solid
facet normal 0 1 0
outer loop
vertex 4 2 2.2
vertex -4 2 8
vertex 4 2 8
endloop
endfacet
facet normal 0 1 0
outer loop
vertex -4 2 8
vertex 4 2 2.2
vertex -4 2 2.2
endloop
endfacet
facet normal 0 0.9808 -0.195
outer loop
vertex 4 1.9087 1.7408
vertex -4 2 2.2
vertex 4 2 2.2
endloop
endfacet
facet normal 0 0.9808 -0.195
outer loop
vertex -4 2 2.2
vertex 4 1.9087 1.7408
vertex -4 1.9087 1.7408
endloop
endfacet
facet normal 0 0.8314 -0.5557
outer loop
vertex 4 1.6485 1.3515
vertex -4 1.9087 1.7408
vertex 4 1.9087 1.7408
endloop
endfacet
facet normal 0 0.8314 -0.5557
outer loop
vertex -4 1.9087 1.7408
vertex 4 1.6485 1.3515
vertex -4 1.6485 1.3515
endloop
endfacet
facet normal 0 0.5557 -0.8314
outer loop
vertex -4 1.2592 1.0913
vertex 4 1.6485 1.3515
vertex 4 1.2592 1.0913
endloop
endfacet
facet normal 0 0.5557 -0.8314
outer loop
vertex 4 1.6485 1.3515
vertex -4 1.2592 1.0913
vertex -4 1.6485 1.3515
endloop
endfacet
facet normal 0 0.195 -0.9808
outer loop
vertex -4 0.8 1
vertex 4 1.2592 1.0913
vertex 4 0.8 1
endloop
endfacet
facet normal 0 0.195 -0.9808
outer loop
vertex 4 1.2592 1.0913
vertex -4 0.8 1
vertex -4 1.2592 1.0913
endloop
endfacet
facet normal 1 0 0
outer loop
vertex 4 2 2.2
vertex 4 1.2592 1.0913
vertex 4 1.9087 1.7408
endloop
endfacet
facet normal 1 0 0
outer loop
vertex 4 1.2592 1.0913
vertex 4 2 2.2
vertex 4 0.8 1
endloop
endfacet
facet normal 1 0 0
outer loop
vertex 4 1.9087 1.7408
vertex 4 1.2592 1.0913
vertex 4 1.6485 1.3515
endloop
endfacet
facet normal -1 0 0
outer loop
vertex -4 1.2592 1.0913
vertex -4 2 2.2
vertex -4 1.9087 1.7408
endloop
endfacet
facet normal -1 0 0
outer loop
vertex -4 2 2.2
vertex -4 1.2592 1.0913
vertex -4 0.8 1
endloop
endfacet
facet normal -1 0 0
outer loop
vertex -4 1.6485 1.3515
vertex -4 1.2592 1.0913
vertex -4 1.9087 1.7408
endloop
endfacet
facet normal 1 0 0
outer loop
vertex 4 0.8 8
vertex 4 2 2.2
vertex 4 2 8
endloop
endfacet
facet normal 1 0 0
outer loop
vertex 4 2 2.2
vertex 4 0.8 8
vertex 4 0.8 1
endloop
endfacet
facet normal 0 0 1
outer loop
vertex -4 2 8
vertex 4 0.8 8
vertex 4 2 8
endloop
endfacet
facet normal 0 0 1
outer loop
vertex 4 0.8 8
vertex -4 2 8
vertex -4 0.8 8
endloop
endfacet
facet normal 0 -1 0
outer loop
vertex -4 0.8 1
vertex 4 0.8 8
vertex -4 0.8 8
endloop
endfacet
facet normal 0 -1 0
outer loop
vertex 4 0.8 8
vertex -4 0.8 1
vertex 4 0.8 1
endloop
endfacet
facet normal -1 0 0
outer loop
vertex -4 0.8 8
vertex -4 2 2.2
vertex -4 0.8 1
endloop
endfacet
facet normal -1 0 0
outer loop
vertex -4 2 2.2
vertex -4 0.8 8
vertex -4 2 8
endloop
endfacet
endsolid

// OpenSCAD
// file: ../p/1-4edge.scad
use <../lib.scad>
function ldraw_lib__1_4edge() = [
// 0 Circle 0.25
// 0 Name: 1-4edge.dat
// 0 Author: James Jessiman
// 0 !LDRAW_ORG Primitive UPDATE 2017-01
// 0 !LICENSE Licensed under CC BY 2.0 and CC BY 4.0 : see CAreadme.txt
// 
// 0 BFC CERTIFY CCW
  [0,"BFC","CERTIFY"],
  [0,"BFC","CCW"],
// 
// 0 !HISTORY 2007-06-22 [PTadmin] Header formatted for Contributor Agreement
// 0 !HISTORY 2008-07-01 [PTadmin] Official Update 2008-01
// 0 !HISTORY 2017-01-15 [Steffen] BFCed
// 0 !HISTORY 2017-12-30 [PTadmin] Official Update 2017-01
// 
// 
// 2 24 1 0 0 0.9239 0 0.3827
  [2,24,1,0,0,0.9239,0,0.3827],
// 2 24 0.9239 0 0.3827 0.7071 0 0.7071
  [2,24,0.9239,0,0.3827,0.7071,0,0.7071],
// 2 24 0.7071 0 0.7071 0.3827 0 0.9239
  [2,24,0.7071,0,0.7071,0.3827,0,0.9239],
// 2 24 0.3827 0 0.9239 0 0 1
  [2,24,0.3827,0,0.9239,0,0,1],
];
makepoly(ldraw_lib__1_4edge(), line=0.2);
// file: ../p/1-4cyli.scad
use <../lib.scad>
function ldraw_lib__1_4cyli() = [
// 0 Cylinder 0.25
// 0 Name: 1-4cyli.dat
// 0 Author: James Jessiman
// 0 !LDRAW_ORG Primitive UPDATE 2012-01
// 0 !LICENSE Licensed under CC BY 2.0 and CC BY 4.0 : see CAreadme.txt
// 
// 0 BFC CERTIFY CCW
  [0,"BFC","CERTIFY"],
  [0,"BFC","CCW"],
// 
// 0 !HISTORY 2002-03-23 [sbliss] Added BFC statement.
// 0 !HISTORY 2002-04-25 [PTadmin] Official Update 2002-02
// 0 !HISTORY 2007-06-22 [PTadmin] Header formatted for Contributor Agreement
// 0 !HISTORY 2008-07-01 [PTadmin] Official Update 2008-01
// 0 !HISTORY 2012-02-16 [Philo] Changed to CCW
// 0 !HISTORY 2012-03-30 [PTadmin] Official Update 2012-01
// 
// 
// 4 16 1 1 0 0.9239 1 0.3827 0.9239 0 0.3827 1 0 0
  [4,16,1,1,0,0.9239,1,0.3827,0.9239,0,0.3827,1,0,0],
// 5 24 1 0 0 1 1 0 0.9239 0 0.3827 1 0 -1
  [5,24,1,0,0,1,1,0,0.9239,0,0.3827,1,0,-1],
// 4 16 0.9239 1 0.3827 0.7071 1 0.7071 0.7071 0 0.7071 0.9239 0 0.3827
  [4,16,0.9239,1,0.3827,0.7071,1,0.7071,0.7071,0,0.7071,0.9239,0,0.3827],
// 5 24 0.9239 0 0.3827 0.9239 1 0.3827 0.7071 0 0.7071 1 0 0
  [5,24,0.9239,0,0.3827,0.9239,1,0.3827,0.7071,0,0.7071,1,0,0],
// 4 16 0.7071 1 0.7071 0.3827 1 0.9239 0.3827 0 0.9239 0.7071 0 0.7071
  [4,16,0.7071,1,0.7071,0.3827,1,0.9239,0.3827,0,0.9239,0.7071,0,0.7071],
// 5 24 0.7071 0 0.7071 0.7071 1 0.7071 0.3827 0 0.9239 0.9239 0 0.3827
  [5,24,0.7071,0,0.7071,0.7071,1,0.7071,0.3827,0,0.9239,0.9239,0,0.3827],
// 4 16 0.3827 1 0.9239 0 1 1 0 0 1 0.3827 0 0.9239
  [4,16,0.3827,1,0.9239,0,1,1,0,0,1,0.3827,0,0.9239],
// 5 24 0.3827 0 0.9239 0.3827 1 0.9239 0 0 1 0.7071 0 0.7071
  [5,24,0.3827,0,0.9239,0.3827,1,0.9239,0,0,1,0.7071,0,0.7071],
// 5 24 0 0 1 0 1 1 0.3827 0 0.9239 -1 0 1
  [5,24,0,0,1,0,1,1,0.3827,0,0.9239,-1,0,1],
];
makepoly(ldraw_lib__1_4cyli(), line=0.2);
// file: ../p/rect3.scad
use <../lib.scad>
function ldraw_lib__rect3() = [
// 0 Rectangle with 3 Edges
// 0 Name: rect3.dat
// 0 Author: Mark Kennedy [mkennedy]
// 0 !LDRAW_ORG Primitive UPDATE 2010-01
// 0 !LICENSE Licensed under CC BY 2.0 and CC BY 4.0 : see CAreadme.txt
// 
// 0 BFC CERTIFY CCW
  [0,"BFC","CERTIFY"],
  [0,"BFC","CCW"],
// 
// 0 !HISTORY 2003-08-01 [PTadmin] Official Update 2003-02
// 0 !HISTORY 2007-06-24 [PTadmin] Header formatted for Contributor Agreement
// 0 !HISTORY 2008-07-01 [PTadmin] Official Update 2008-01
// 0 !HISTORY 2010-01-17 [mikeheide] Change winding to CCW
// 0 !HISTORY 2010-04-05 [PTadmin] Official Update 2010-01
// 
// 
// 2 24 1 0 1 -1 0 1
  [2,24,1,0,1,-1,0,1],
// 2 24 1 0 1 1 0 -1
  [2,24,1,0,1,1,0,-1],
// 2 24 -1 0 1 -1 0 -1
  [2,24,-1,0,1,-1,0,-1],
// 4 16 -1 0 1 -1 0 -1 1 0 -1 1 0 1
  [4,16,-1,0,1,-1,0,-1,1,0,-1,1,0,1],
// 0 //
];
makepoly(ldraw_lib__rect3(), line=0.2);
// file: ../p/1-4cylo.scad
use <../lib.scad>
use <1-4cyli.scad>
use <1-4edge.scad>
function ldraw_lib__1_4cylo() = [
// 0 Cylinder Open 0.25
// 0 Name: 1-4cylo.dat
// 0 Author: Max Martin Richter [MMR1988]
// 0 !LDRAW_ORG Primitive UPDATE 2010-03
// 0 !LICENSE Licensed under CC BY 2.0 and CC BY 4.0 : see CAreadme.txt
// 
// 0 BFC CERTIFY CCW
  [0,"BFC","CERTIFY"],
  [0,"BFC","CCW"],
// 
// 0 !HISTORY 2010-12-31 [PTadmin] Official Update 2010-03
// 
// 
// 1 16 0 0 0 1 0 0 0 1 0 0 0 1 1-4edge.dat
  [1,16,0,0,0,1,0,0,0,1,0,0,0,1, ldraw_lib__1_4edge()],
// 1 16 0 1 0 1 0 0 0 1 0 0 0 1 1-4edge.dat
  [1,16,0,1,0,1,0,0,0,1,0,0,0,1, ldraw_lib__1_4edge()],
// 1 16 0 0 0 1 0 0 0 1 0 0 0 1 1-4cyli.dat
  [1,16,0,0,0,1,0,0,0,1,0,0,0,1, ldraw_lib__1_4cyli()],
];
makepoly(ldraw_lib__1_4cylo(), line=0.2);
// file: ../p/1-4chrd.scad
use <../lib.scad>
function ldraw_lib__1_4chrd() = [
// 0 Chord 0.25
// 0 Name: 1-4chrd.dat
// 0 Author: Tony Hafner [hafhead]
// 0 !LDRAW_ORG Primitive UPDATE 2012-02
// 0 !LICENSE Licensed under CC BY 2.0 and CC BY 4.0 : see CAreadme.txt
// 
// 0 BFC CERTIFY CCW
  [0,"BFC","CERTIFY"],
  [0,"BFC","CCW"],
// 
// 0 !HISTORY 2004-04-22 [PTadmin] Official Update 2004-02
// 0 !HISTORY 2007-10-09 [PTadmin] Header formatted for Contributor Agreement
// 0 !HISTORY 2008-07-01 [PTadmin] Official Update 2008-01
// 0 !HISTORY 2012-08-02 [MMR1988] Re-creation with PrimGen2 and Rectifier
// 0 !HISTORY 2012-08-09 [PTadmin] Official Update 2012-02
// 
// 
// 4 16 0.9239 0 0.3827 0.3827 0 0.9239 0 0 1 1 0 0
  [4,16,0.9239,0,0.3827,0.3827,0,0.9239,0,0,1,1,0,0],
// 3 16 0.7071 0 0.7071 0.3827 0 0.9239 0.9239 0 0.3827
  [3,16,0.7071,0,0.7071,0.3827,0,0.9239,0.9239,0,0.3827],
];
makepoly(ldraw_lib__1_4chrd(), line=0.2);
// main file
use <../lib.scad>
use <../p/1-4chrd.scad>
use <../p/1-4cylo.scad>
use <../p/rect3.scad>
function ldraw_lib__u9471() = [
// 0 ~Electric Powered Up Medium Angular Motor Cable Lock
// 0 Name: u9471.dat
// 0 Author: Philippe Hurbain [Philo]
// 0 !LDRAW_ORG Part UPDATE 2020-03
// 0 !LICENSE Licensed under CC BY 2.0 and CC BY 4.0 : see CAreadme.txt
// 
// 0 BFC CERTIFY CCW
  [0,"BFC","CERTIFY"],
  [0,"BFC","CCW"],
// 
// 0 !KEYWORDS Mindstorms, Robot Inventor, Spike Prime
// 
// 0 !HISTORY 2020-06-28 [PTadmin] Official Update 2020-01
// 0 !HISTORY 2020-12-27 [PTadmin] Update description
// 0 !HISTORY 2020-12-29 [PTadmin] Official Update 2020-03
// 
// 
// 1 16 0 -12.75 5 -10 0 0 0 0 -7.25 0 -1 0 rect3.dat
  [1,16,0,-12.75,5,-10,0,0,0,0,-7.25,0,-1,0, ldraw_lib__rect3()],
// 1 16 10 -5.5 2 0 -20 0 0 0 3 3 0 0 1-4cylo.dat
  [1,16,10,-5.5,2,0,-20,0,0,0,3,3,0,0, ldraw_lib__1_4cylo()],
// 1 16 10 -5.5 2 0 -20 0 0 0 3 3 0 0 1-4chrd.dat
  [1,16,10,-5.5,2,0,-20,0,0,0,3,3,0,0, ldraw_lib__1_4chrd()],
// 1 16 -10 -5.5 2 0 20 0 0 0 3 3 0 0 1-4chrd.dat
  [1,16,-10,-5.5,2,0,20,0,0,0,3,3,0,0, ldraw_lib__1_4chrd()],
// 4 16 10 -5.5 5 10 -20 5 10 -20 2 10 -2.5 2
  [4,16,10,-5.5,5,10,-20,5,10,-20,2,10,-2.5,2],
// 1 16 0 -20 3.5 -10 0 0 0 1 0 0 0 -1.5 rect3.dat
  [1,16,0,-20,3.5,-10,0,0,0,1,0,0,0,-1.5, ldraw_lib__rect3()],
// 1 16 0 -11.25 2 -10 0 0 0 0 8.75 0 1 0 rect3.dat
  [1,16,0,-11.25,2,-10,0,0,0,0,8.75,0,1,0, ldraw_lib__rect3()],
// 4 16 -10 -5.5 5 -10 -2.5 2 -10 -20 2 -10 -20 5
  [4,16,-10,-5.5,5,-10,-2.5,2,-10,-20,2,-10,-20,5],
];
makepoly(ldraw_lib__u9471(), line=0.2);
